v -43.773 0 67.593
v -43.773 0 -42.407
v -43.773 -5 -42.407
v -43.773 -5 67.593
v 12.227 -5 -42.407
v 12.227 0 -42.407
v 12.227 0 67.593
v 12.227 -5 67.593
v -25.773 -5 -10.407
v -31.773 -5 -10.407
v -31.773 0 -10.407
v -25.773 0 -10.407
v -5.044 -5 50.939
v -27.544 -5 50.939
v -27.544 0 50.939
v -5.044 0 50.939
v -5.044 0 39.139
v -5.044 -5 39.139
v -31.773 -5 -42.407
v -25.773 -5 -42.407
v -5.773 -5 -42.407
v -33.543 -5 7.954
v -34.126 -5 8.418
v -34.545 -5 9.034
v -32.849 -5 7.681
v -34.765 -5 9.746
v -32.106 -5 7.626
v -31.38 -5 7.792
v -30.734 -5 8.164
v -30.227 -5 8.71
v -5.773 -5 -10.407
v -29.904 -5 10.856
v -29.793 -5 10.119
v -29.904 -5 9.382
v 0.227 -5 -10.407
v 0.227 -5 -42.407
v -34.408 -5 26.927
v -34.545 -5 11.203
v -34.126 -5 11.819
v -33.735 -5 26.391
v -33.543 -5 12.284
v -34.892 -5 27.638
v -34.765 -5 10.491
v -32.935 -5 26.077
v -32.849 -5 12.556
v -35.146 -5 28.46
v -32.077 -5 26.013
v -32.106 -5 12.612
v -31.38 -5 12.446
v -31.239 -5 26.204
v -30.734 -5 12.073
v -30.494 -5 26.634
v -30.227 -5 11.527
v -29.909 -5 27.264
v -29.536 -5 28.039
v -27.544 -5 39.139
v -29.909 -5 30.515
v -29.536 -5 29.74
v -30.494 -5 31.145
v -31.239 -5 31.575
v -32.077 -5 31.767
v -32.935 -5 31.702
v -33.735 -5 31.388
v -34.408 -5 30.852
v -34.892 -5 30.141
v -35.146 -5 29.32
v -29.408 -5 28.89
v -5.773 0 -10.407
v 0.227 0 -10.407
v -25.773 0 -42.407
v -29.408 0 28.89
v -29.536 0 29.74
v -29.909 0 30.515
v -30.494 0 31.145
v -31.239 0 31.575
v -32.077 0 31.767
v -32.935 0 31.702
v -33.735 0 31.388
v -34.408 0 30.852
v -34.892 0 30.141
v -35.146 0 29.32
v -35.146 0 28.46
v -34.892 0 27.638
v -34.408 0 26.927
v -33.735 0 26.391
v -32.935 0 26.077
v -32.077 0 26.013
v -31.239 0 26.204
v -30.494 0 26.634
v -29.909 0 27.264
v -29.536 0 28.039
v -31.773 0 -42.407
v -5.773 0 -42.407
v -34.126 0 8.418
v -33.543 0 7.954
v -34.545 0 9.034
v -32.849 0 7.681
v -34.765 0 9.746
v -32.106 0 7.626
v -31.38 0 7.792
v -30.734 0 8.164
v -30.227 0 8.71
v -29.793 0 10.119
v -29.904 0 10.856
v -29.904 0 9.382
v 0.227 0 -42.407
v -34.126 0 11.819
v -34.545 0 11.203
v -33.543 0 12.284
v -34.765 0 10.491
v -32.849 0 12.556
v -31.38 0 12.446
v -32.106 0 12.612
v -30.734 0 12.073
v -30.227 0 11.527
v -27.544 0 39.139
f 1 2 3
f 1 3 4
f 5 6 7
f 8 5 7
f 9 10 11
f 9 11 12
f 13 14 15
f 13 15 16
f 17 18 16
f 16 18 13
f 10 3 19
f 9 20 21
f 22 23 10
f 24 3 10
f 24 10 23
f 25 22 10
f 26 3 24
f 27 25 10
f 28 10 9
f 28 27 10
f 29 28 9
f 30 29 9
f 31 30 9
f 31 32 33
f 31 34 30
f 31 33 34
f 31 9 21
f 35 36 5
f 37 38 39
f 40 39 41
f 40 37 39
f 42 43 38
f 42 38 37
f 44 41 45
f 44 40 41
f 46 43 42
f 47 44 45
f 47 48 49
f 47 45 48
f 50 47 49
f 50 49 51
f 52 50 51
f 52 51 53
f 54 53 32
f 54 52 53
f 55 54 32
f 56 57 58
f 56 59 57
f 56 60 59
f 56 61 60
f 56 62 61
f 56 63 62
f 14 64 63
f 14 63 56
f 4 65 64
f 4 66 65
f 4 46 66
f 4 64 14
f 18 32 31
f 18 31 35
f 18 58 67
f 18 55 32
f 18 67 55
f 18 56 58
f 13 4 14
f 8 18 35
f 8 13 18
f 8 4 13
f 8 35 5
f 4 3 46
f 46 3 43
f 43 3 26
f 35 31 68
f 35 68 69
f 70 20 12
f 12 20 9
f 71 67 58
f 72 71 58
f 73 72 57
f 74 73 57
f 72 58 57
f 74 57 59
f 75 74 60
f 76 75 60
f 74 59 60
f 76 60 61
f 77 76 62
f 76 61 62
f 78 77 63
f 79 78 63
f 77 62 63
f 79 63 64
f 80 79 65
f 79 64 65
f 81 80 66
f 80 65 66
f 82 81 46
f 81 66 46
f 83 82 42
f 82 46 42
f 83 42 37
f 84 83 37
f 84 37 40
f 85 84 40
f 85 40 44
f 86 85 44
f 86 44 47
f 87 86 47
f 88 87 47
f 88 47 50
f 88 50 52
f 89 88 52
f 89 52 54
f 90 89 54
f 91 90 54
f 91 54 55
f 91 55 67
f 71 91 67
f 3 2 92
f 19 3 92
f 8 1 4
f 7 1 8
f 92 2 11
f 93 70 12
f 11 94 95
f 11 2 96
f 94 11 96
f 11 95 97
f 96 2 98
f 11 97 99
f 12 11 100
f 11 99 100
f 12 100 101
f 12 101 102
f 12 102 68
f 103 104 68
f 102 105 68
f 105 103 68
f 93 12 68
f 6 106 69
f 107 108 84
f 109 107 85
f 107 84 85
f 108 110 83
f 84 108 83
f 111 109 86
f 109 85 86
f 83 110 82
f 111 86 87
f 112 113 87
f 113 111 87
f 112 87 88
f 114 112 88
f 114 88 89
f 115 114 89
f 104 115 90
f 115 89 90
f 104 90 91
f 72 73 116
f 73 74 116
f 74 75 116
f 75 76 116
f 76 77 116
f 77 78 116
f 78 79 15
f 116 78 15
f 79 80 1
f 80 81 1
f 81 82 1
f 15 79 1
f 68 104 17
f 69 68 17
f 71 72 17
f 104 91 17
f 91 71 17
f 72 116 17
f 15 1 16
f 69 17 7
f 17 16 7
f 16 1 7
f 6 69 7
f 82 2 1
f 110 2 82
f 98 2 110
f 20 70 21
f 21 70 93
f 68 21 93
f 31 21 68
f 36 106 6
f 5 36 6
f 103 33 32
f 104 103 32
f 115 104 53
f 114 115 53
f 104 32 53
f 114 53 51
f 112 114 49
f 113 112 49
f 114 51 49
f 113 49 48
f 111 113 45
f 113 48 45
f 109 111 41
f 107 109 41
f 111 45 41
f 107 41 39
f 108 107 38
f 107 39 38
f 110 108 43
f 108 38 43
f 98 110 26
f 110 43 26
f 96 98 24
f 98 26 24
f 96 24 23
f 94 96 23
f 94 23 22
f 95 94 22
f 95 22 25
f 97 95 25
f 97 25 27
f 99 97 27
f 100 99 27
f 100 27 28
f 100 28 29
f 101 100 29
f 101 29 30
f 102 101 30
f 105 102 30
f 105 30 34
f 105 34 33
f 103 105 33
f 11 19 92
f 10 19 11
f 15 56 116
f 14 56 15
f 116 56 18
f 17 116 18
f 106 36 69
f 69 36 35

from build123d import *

# Parameters (mm, degrees)
F0_W     = 56
F0_H     = 110
F1_DEPTH = 5
F2_W     = 6
F2_H     = 32
F2_W_2   = 22.5
F2_H_2   = 11.8
F2_R     = 2.885
F2_R_2   = 2.5
F3_DEPTH = 25


with BuildPart() as f1:
    # F0 (on Front) → F1 (new body)
    with BuildSketch(Plane.XZ):
        with Locations((-15.773296, 12.593315)):
            Rectangle(F0_W, F0_H)
    extrude(amount=F1_DEPTH)

    # F2 (on face) → F3 (cut)
    with BuildSketch(Plane.XZ.offset(5)):
        with Locations((-2.773296, -26.406685)):
            Rectangle(F2_W, F2_H)
        with Locations((-28.773296, -26.406685)):
            Rectangle(F2_W, F2_H)
        with Locations((-16.29366, 45.039438)):
            Rectangle(F2_W_2, F2_H_2)
        with Locations((-32.292966, 28.889665)):
            Circle(F2_R)
        with Locations((-32.292966, 10.118715)):
            Circle(F2_R_2)
    extrude(amount=-F3_DEPTH, mode=Mode.SUBTRACT)


solid = f1.part
